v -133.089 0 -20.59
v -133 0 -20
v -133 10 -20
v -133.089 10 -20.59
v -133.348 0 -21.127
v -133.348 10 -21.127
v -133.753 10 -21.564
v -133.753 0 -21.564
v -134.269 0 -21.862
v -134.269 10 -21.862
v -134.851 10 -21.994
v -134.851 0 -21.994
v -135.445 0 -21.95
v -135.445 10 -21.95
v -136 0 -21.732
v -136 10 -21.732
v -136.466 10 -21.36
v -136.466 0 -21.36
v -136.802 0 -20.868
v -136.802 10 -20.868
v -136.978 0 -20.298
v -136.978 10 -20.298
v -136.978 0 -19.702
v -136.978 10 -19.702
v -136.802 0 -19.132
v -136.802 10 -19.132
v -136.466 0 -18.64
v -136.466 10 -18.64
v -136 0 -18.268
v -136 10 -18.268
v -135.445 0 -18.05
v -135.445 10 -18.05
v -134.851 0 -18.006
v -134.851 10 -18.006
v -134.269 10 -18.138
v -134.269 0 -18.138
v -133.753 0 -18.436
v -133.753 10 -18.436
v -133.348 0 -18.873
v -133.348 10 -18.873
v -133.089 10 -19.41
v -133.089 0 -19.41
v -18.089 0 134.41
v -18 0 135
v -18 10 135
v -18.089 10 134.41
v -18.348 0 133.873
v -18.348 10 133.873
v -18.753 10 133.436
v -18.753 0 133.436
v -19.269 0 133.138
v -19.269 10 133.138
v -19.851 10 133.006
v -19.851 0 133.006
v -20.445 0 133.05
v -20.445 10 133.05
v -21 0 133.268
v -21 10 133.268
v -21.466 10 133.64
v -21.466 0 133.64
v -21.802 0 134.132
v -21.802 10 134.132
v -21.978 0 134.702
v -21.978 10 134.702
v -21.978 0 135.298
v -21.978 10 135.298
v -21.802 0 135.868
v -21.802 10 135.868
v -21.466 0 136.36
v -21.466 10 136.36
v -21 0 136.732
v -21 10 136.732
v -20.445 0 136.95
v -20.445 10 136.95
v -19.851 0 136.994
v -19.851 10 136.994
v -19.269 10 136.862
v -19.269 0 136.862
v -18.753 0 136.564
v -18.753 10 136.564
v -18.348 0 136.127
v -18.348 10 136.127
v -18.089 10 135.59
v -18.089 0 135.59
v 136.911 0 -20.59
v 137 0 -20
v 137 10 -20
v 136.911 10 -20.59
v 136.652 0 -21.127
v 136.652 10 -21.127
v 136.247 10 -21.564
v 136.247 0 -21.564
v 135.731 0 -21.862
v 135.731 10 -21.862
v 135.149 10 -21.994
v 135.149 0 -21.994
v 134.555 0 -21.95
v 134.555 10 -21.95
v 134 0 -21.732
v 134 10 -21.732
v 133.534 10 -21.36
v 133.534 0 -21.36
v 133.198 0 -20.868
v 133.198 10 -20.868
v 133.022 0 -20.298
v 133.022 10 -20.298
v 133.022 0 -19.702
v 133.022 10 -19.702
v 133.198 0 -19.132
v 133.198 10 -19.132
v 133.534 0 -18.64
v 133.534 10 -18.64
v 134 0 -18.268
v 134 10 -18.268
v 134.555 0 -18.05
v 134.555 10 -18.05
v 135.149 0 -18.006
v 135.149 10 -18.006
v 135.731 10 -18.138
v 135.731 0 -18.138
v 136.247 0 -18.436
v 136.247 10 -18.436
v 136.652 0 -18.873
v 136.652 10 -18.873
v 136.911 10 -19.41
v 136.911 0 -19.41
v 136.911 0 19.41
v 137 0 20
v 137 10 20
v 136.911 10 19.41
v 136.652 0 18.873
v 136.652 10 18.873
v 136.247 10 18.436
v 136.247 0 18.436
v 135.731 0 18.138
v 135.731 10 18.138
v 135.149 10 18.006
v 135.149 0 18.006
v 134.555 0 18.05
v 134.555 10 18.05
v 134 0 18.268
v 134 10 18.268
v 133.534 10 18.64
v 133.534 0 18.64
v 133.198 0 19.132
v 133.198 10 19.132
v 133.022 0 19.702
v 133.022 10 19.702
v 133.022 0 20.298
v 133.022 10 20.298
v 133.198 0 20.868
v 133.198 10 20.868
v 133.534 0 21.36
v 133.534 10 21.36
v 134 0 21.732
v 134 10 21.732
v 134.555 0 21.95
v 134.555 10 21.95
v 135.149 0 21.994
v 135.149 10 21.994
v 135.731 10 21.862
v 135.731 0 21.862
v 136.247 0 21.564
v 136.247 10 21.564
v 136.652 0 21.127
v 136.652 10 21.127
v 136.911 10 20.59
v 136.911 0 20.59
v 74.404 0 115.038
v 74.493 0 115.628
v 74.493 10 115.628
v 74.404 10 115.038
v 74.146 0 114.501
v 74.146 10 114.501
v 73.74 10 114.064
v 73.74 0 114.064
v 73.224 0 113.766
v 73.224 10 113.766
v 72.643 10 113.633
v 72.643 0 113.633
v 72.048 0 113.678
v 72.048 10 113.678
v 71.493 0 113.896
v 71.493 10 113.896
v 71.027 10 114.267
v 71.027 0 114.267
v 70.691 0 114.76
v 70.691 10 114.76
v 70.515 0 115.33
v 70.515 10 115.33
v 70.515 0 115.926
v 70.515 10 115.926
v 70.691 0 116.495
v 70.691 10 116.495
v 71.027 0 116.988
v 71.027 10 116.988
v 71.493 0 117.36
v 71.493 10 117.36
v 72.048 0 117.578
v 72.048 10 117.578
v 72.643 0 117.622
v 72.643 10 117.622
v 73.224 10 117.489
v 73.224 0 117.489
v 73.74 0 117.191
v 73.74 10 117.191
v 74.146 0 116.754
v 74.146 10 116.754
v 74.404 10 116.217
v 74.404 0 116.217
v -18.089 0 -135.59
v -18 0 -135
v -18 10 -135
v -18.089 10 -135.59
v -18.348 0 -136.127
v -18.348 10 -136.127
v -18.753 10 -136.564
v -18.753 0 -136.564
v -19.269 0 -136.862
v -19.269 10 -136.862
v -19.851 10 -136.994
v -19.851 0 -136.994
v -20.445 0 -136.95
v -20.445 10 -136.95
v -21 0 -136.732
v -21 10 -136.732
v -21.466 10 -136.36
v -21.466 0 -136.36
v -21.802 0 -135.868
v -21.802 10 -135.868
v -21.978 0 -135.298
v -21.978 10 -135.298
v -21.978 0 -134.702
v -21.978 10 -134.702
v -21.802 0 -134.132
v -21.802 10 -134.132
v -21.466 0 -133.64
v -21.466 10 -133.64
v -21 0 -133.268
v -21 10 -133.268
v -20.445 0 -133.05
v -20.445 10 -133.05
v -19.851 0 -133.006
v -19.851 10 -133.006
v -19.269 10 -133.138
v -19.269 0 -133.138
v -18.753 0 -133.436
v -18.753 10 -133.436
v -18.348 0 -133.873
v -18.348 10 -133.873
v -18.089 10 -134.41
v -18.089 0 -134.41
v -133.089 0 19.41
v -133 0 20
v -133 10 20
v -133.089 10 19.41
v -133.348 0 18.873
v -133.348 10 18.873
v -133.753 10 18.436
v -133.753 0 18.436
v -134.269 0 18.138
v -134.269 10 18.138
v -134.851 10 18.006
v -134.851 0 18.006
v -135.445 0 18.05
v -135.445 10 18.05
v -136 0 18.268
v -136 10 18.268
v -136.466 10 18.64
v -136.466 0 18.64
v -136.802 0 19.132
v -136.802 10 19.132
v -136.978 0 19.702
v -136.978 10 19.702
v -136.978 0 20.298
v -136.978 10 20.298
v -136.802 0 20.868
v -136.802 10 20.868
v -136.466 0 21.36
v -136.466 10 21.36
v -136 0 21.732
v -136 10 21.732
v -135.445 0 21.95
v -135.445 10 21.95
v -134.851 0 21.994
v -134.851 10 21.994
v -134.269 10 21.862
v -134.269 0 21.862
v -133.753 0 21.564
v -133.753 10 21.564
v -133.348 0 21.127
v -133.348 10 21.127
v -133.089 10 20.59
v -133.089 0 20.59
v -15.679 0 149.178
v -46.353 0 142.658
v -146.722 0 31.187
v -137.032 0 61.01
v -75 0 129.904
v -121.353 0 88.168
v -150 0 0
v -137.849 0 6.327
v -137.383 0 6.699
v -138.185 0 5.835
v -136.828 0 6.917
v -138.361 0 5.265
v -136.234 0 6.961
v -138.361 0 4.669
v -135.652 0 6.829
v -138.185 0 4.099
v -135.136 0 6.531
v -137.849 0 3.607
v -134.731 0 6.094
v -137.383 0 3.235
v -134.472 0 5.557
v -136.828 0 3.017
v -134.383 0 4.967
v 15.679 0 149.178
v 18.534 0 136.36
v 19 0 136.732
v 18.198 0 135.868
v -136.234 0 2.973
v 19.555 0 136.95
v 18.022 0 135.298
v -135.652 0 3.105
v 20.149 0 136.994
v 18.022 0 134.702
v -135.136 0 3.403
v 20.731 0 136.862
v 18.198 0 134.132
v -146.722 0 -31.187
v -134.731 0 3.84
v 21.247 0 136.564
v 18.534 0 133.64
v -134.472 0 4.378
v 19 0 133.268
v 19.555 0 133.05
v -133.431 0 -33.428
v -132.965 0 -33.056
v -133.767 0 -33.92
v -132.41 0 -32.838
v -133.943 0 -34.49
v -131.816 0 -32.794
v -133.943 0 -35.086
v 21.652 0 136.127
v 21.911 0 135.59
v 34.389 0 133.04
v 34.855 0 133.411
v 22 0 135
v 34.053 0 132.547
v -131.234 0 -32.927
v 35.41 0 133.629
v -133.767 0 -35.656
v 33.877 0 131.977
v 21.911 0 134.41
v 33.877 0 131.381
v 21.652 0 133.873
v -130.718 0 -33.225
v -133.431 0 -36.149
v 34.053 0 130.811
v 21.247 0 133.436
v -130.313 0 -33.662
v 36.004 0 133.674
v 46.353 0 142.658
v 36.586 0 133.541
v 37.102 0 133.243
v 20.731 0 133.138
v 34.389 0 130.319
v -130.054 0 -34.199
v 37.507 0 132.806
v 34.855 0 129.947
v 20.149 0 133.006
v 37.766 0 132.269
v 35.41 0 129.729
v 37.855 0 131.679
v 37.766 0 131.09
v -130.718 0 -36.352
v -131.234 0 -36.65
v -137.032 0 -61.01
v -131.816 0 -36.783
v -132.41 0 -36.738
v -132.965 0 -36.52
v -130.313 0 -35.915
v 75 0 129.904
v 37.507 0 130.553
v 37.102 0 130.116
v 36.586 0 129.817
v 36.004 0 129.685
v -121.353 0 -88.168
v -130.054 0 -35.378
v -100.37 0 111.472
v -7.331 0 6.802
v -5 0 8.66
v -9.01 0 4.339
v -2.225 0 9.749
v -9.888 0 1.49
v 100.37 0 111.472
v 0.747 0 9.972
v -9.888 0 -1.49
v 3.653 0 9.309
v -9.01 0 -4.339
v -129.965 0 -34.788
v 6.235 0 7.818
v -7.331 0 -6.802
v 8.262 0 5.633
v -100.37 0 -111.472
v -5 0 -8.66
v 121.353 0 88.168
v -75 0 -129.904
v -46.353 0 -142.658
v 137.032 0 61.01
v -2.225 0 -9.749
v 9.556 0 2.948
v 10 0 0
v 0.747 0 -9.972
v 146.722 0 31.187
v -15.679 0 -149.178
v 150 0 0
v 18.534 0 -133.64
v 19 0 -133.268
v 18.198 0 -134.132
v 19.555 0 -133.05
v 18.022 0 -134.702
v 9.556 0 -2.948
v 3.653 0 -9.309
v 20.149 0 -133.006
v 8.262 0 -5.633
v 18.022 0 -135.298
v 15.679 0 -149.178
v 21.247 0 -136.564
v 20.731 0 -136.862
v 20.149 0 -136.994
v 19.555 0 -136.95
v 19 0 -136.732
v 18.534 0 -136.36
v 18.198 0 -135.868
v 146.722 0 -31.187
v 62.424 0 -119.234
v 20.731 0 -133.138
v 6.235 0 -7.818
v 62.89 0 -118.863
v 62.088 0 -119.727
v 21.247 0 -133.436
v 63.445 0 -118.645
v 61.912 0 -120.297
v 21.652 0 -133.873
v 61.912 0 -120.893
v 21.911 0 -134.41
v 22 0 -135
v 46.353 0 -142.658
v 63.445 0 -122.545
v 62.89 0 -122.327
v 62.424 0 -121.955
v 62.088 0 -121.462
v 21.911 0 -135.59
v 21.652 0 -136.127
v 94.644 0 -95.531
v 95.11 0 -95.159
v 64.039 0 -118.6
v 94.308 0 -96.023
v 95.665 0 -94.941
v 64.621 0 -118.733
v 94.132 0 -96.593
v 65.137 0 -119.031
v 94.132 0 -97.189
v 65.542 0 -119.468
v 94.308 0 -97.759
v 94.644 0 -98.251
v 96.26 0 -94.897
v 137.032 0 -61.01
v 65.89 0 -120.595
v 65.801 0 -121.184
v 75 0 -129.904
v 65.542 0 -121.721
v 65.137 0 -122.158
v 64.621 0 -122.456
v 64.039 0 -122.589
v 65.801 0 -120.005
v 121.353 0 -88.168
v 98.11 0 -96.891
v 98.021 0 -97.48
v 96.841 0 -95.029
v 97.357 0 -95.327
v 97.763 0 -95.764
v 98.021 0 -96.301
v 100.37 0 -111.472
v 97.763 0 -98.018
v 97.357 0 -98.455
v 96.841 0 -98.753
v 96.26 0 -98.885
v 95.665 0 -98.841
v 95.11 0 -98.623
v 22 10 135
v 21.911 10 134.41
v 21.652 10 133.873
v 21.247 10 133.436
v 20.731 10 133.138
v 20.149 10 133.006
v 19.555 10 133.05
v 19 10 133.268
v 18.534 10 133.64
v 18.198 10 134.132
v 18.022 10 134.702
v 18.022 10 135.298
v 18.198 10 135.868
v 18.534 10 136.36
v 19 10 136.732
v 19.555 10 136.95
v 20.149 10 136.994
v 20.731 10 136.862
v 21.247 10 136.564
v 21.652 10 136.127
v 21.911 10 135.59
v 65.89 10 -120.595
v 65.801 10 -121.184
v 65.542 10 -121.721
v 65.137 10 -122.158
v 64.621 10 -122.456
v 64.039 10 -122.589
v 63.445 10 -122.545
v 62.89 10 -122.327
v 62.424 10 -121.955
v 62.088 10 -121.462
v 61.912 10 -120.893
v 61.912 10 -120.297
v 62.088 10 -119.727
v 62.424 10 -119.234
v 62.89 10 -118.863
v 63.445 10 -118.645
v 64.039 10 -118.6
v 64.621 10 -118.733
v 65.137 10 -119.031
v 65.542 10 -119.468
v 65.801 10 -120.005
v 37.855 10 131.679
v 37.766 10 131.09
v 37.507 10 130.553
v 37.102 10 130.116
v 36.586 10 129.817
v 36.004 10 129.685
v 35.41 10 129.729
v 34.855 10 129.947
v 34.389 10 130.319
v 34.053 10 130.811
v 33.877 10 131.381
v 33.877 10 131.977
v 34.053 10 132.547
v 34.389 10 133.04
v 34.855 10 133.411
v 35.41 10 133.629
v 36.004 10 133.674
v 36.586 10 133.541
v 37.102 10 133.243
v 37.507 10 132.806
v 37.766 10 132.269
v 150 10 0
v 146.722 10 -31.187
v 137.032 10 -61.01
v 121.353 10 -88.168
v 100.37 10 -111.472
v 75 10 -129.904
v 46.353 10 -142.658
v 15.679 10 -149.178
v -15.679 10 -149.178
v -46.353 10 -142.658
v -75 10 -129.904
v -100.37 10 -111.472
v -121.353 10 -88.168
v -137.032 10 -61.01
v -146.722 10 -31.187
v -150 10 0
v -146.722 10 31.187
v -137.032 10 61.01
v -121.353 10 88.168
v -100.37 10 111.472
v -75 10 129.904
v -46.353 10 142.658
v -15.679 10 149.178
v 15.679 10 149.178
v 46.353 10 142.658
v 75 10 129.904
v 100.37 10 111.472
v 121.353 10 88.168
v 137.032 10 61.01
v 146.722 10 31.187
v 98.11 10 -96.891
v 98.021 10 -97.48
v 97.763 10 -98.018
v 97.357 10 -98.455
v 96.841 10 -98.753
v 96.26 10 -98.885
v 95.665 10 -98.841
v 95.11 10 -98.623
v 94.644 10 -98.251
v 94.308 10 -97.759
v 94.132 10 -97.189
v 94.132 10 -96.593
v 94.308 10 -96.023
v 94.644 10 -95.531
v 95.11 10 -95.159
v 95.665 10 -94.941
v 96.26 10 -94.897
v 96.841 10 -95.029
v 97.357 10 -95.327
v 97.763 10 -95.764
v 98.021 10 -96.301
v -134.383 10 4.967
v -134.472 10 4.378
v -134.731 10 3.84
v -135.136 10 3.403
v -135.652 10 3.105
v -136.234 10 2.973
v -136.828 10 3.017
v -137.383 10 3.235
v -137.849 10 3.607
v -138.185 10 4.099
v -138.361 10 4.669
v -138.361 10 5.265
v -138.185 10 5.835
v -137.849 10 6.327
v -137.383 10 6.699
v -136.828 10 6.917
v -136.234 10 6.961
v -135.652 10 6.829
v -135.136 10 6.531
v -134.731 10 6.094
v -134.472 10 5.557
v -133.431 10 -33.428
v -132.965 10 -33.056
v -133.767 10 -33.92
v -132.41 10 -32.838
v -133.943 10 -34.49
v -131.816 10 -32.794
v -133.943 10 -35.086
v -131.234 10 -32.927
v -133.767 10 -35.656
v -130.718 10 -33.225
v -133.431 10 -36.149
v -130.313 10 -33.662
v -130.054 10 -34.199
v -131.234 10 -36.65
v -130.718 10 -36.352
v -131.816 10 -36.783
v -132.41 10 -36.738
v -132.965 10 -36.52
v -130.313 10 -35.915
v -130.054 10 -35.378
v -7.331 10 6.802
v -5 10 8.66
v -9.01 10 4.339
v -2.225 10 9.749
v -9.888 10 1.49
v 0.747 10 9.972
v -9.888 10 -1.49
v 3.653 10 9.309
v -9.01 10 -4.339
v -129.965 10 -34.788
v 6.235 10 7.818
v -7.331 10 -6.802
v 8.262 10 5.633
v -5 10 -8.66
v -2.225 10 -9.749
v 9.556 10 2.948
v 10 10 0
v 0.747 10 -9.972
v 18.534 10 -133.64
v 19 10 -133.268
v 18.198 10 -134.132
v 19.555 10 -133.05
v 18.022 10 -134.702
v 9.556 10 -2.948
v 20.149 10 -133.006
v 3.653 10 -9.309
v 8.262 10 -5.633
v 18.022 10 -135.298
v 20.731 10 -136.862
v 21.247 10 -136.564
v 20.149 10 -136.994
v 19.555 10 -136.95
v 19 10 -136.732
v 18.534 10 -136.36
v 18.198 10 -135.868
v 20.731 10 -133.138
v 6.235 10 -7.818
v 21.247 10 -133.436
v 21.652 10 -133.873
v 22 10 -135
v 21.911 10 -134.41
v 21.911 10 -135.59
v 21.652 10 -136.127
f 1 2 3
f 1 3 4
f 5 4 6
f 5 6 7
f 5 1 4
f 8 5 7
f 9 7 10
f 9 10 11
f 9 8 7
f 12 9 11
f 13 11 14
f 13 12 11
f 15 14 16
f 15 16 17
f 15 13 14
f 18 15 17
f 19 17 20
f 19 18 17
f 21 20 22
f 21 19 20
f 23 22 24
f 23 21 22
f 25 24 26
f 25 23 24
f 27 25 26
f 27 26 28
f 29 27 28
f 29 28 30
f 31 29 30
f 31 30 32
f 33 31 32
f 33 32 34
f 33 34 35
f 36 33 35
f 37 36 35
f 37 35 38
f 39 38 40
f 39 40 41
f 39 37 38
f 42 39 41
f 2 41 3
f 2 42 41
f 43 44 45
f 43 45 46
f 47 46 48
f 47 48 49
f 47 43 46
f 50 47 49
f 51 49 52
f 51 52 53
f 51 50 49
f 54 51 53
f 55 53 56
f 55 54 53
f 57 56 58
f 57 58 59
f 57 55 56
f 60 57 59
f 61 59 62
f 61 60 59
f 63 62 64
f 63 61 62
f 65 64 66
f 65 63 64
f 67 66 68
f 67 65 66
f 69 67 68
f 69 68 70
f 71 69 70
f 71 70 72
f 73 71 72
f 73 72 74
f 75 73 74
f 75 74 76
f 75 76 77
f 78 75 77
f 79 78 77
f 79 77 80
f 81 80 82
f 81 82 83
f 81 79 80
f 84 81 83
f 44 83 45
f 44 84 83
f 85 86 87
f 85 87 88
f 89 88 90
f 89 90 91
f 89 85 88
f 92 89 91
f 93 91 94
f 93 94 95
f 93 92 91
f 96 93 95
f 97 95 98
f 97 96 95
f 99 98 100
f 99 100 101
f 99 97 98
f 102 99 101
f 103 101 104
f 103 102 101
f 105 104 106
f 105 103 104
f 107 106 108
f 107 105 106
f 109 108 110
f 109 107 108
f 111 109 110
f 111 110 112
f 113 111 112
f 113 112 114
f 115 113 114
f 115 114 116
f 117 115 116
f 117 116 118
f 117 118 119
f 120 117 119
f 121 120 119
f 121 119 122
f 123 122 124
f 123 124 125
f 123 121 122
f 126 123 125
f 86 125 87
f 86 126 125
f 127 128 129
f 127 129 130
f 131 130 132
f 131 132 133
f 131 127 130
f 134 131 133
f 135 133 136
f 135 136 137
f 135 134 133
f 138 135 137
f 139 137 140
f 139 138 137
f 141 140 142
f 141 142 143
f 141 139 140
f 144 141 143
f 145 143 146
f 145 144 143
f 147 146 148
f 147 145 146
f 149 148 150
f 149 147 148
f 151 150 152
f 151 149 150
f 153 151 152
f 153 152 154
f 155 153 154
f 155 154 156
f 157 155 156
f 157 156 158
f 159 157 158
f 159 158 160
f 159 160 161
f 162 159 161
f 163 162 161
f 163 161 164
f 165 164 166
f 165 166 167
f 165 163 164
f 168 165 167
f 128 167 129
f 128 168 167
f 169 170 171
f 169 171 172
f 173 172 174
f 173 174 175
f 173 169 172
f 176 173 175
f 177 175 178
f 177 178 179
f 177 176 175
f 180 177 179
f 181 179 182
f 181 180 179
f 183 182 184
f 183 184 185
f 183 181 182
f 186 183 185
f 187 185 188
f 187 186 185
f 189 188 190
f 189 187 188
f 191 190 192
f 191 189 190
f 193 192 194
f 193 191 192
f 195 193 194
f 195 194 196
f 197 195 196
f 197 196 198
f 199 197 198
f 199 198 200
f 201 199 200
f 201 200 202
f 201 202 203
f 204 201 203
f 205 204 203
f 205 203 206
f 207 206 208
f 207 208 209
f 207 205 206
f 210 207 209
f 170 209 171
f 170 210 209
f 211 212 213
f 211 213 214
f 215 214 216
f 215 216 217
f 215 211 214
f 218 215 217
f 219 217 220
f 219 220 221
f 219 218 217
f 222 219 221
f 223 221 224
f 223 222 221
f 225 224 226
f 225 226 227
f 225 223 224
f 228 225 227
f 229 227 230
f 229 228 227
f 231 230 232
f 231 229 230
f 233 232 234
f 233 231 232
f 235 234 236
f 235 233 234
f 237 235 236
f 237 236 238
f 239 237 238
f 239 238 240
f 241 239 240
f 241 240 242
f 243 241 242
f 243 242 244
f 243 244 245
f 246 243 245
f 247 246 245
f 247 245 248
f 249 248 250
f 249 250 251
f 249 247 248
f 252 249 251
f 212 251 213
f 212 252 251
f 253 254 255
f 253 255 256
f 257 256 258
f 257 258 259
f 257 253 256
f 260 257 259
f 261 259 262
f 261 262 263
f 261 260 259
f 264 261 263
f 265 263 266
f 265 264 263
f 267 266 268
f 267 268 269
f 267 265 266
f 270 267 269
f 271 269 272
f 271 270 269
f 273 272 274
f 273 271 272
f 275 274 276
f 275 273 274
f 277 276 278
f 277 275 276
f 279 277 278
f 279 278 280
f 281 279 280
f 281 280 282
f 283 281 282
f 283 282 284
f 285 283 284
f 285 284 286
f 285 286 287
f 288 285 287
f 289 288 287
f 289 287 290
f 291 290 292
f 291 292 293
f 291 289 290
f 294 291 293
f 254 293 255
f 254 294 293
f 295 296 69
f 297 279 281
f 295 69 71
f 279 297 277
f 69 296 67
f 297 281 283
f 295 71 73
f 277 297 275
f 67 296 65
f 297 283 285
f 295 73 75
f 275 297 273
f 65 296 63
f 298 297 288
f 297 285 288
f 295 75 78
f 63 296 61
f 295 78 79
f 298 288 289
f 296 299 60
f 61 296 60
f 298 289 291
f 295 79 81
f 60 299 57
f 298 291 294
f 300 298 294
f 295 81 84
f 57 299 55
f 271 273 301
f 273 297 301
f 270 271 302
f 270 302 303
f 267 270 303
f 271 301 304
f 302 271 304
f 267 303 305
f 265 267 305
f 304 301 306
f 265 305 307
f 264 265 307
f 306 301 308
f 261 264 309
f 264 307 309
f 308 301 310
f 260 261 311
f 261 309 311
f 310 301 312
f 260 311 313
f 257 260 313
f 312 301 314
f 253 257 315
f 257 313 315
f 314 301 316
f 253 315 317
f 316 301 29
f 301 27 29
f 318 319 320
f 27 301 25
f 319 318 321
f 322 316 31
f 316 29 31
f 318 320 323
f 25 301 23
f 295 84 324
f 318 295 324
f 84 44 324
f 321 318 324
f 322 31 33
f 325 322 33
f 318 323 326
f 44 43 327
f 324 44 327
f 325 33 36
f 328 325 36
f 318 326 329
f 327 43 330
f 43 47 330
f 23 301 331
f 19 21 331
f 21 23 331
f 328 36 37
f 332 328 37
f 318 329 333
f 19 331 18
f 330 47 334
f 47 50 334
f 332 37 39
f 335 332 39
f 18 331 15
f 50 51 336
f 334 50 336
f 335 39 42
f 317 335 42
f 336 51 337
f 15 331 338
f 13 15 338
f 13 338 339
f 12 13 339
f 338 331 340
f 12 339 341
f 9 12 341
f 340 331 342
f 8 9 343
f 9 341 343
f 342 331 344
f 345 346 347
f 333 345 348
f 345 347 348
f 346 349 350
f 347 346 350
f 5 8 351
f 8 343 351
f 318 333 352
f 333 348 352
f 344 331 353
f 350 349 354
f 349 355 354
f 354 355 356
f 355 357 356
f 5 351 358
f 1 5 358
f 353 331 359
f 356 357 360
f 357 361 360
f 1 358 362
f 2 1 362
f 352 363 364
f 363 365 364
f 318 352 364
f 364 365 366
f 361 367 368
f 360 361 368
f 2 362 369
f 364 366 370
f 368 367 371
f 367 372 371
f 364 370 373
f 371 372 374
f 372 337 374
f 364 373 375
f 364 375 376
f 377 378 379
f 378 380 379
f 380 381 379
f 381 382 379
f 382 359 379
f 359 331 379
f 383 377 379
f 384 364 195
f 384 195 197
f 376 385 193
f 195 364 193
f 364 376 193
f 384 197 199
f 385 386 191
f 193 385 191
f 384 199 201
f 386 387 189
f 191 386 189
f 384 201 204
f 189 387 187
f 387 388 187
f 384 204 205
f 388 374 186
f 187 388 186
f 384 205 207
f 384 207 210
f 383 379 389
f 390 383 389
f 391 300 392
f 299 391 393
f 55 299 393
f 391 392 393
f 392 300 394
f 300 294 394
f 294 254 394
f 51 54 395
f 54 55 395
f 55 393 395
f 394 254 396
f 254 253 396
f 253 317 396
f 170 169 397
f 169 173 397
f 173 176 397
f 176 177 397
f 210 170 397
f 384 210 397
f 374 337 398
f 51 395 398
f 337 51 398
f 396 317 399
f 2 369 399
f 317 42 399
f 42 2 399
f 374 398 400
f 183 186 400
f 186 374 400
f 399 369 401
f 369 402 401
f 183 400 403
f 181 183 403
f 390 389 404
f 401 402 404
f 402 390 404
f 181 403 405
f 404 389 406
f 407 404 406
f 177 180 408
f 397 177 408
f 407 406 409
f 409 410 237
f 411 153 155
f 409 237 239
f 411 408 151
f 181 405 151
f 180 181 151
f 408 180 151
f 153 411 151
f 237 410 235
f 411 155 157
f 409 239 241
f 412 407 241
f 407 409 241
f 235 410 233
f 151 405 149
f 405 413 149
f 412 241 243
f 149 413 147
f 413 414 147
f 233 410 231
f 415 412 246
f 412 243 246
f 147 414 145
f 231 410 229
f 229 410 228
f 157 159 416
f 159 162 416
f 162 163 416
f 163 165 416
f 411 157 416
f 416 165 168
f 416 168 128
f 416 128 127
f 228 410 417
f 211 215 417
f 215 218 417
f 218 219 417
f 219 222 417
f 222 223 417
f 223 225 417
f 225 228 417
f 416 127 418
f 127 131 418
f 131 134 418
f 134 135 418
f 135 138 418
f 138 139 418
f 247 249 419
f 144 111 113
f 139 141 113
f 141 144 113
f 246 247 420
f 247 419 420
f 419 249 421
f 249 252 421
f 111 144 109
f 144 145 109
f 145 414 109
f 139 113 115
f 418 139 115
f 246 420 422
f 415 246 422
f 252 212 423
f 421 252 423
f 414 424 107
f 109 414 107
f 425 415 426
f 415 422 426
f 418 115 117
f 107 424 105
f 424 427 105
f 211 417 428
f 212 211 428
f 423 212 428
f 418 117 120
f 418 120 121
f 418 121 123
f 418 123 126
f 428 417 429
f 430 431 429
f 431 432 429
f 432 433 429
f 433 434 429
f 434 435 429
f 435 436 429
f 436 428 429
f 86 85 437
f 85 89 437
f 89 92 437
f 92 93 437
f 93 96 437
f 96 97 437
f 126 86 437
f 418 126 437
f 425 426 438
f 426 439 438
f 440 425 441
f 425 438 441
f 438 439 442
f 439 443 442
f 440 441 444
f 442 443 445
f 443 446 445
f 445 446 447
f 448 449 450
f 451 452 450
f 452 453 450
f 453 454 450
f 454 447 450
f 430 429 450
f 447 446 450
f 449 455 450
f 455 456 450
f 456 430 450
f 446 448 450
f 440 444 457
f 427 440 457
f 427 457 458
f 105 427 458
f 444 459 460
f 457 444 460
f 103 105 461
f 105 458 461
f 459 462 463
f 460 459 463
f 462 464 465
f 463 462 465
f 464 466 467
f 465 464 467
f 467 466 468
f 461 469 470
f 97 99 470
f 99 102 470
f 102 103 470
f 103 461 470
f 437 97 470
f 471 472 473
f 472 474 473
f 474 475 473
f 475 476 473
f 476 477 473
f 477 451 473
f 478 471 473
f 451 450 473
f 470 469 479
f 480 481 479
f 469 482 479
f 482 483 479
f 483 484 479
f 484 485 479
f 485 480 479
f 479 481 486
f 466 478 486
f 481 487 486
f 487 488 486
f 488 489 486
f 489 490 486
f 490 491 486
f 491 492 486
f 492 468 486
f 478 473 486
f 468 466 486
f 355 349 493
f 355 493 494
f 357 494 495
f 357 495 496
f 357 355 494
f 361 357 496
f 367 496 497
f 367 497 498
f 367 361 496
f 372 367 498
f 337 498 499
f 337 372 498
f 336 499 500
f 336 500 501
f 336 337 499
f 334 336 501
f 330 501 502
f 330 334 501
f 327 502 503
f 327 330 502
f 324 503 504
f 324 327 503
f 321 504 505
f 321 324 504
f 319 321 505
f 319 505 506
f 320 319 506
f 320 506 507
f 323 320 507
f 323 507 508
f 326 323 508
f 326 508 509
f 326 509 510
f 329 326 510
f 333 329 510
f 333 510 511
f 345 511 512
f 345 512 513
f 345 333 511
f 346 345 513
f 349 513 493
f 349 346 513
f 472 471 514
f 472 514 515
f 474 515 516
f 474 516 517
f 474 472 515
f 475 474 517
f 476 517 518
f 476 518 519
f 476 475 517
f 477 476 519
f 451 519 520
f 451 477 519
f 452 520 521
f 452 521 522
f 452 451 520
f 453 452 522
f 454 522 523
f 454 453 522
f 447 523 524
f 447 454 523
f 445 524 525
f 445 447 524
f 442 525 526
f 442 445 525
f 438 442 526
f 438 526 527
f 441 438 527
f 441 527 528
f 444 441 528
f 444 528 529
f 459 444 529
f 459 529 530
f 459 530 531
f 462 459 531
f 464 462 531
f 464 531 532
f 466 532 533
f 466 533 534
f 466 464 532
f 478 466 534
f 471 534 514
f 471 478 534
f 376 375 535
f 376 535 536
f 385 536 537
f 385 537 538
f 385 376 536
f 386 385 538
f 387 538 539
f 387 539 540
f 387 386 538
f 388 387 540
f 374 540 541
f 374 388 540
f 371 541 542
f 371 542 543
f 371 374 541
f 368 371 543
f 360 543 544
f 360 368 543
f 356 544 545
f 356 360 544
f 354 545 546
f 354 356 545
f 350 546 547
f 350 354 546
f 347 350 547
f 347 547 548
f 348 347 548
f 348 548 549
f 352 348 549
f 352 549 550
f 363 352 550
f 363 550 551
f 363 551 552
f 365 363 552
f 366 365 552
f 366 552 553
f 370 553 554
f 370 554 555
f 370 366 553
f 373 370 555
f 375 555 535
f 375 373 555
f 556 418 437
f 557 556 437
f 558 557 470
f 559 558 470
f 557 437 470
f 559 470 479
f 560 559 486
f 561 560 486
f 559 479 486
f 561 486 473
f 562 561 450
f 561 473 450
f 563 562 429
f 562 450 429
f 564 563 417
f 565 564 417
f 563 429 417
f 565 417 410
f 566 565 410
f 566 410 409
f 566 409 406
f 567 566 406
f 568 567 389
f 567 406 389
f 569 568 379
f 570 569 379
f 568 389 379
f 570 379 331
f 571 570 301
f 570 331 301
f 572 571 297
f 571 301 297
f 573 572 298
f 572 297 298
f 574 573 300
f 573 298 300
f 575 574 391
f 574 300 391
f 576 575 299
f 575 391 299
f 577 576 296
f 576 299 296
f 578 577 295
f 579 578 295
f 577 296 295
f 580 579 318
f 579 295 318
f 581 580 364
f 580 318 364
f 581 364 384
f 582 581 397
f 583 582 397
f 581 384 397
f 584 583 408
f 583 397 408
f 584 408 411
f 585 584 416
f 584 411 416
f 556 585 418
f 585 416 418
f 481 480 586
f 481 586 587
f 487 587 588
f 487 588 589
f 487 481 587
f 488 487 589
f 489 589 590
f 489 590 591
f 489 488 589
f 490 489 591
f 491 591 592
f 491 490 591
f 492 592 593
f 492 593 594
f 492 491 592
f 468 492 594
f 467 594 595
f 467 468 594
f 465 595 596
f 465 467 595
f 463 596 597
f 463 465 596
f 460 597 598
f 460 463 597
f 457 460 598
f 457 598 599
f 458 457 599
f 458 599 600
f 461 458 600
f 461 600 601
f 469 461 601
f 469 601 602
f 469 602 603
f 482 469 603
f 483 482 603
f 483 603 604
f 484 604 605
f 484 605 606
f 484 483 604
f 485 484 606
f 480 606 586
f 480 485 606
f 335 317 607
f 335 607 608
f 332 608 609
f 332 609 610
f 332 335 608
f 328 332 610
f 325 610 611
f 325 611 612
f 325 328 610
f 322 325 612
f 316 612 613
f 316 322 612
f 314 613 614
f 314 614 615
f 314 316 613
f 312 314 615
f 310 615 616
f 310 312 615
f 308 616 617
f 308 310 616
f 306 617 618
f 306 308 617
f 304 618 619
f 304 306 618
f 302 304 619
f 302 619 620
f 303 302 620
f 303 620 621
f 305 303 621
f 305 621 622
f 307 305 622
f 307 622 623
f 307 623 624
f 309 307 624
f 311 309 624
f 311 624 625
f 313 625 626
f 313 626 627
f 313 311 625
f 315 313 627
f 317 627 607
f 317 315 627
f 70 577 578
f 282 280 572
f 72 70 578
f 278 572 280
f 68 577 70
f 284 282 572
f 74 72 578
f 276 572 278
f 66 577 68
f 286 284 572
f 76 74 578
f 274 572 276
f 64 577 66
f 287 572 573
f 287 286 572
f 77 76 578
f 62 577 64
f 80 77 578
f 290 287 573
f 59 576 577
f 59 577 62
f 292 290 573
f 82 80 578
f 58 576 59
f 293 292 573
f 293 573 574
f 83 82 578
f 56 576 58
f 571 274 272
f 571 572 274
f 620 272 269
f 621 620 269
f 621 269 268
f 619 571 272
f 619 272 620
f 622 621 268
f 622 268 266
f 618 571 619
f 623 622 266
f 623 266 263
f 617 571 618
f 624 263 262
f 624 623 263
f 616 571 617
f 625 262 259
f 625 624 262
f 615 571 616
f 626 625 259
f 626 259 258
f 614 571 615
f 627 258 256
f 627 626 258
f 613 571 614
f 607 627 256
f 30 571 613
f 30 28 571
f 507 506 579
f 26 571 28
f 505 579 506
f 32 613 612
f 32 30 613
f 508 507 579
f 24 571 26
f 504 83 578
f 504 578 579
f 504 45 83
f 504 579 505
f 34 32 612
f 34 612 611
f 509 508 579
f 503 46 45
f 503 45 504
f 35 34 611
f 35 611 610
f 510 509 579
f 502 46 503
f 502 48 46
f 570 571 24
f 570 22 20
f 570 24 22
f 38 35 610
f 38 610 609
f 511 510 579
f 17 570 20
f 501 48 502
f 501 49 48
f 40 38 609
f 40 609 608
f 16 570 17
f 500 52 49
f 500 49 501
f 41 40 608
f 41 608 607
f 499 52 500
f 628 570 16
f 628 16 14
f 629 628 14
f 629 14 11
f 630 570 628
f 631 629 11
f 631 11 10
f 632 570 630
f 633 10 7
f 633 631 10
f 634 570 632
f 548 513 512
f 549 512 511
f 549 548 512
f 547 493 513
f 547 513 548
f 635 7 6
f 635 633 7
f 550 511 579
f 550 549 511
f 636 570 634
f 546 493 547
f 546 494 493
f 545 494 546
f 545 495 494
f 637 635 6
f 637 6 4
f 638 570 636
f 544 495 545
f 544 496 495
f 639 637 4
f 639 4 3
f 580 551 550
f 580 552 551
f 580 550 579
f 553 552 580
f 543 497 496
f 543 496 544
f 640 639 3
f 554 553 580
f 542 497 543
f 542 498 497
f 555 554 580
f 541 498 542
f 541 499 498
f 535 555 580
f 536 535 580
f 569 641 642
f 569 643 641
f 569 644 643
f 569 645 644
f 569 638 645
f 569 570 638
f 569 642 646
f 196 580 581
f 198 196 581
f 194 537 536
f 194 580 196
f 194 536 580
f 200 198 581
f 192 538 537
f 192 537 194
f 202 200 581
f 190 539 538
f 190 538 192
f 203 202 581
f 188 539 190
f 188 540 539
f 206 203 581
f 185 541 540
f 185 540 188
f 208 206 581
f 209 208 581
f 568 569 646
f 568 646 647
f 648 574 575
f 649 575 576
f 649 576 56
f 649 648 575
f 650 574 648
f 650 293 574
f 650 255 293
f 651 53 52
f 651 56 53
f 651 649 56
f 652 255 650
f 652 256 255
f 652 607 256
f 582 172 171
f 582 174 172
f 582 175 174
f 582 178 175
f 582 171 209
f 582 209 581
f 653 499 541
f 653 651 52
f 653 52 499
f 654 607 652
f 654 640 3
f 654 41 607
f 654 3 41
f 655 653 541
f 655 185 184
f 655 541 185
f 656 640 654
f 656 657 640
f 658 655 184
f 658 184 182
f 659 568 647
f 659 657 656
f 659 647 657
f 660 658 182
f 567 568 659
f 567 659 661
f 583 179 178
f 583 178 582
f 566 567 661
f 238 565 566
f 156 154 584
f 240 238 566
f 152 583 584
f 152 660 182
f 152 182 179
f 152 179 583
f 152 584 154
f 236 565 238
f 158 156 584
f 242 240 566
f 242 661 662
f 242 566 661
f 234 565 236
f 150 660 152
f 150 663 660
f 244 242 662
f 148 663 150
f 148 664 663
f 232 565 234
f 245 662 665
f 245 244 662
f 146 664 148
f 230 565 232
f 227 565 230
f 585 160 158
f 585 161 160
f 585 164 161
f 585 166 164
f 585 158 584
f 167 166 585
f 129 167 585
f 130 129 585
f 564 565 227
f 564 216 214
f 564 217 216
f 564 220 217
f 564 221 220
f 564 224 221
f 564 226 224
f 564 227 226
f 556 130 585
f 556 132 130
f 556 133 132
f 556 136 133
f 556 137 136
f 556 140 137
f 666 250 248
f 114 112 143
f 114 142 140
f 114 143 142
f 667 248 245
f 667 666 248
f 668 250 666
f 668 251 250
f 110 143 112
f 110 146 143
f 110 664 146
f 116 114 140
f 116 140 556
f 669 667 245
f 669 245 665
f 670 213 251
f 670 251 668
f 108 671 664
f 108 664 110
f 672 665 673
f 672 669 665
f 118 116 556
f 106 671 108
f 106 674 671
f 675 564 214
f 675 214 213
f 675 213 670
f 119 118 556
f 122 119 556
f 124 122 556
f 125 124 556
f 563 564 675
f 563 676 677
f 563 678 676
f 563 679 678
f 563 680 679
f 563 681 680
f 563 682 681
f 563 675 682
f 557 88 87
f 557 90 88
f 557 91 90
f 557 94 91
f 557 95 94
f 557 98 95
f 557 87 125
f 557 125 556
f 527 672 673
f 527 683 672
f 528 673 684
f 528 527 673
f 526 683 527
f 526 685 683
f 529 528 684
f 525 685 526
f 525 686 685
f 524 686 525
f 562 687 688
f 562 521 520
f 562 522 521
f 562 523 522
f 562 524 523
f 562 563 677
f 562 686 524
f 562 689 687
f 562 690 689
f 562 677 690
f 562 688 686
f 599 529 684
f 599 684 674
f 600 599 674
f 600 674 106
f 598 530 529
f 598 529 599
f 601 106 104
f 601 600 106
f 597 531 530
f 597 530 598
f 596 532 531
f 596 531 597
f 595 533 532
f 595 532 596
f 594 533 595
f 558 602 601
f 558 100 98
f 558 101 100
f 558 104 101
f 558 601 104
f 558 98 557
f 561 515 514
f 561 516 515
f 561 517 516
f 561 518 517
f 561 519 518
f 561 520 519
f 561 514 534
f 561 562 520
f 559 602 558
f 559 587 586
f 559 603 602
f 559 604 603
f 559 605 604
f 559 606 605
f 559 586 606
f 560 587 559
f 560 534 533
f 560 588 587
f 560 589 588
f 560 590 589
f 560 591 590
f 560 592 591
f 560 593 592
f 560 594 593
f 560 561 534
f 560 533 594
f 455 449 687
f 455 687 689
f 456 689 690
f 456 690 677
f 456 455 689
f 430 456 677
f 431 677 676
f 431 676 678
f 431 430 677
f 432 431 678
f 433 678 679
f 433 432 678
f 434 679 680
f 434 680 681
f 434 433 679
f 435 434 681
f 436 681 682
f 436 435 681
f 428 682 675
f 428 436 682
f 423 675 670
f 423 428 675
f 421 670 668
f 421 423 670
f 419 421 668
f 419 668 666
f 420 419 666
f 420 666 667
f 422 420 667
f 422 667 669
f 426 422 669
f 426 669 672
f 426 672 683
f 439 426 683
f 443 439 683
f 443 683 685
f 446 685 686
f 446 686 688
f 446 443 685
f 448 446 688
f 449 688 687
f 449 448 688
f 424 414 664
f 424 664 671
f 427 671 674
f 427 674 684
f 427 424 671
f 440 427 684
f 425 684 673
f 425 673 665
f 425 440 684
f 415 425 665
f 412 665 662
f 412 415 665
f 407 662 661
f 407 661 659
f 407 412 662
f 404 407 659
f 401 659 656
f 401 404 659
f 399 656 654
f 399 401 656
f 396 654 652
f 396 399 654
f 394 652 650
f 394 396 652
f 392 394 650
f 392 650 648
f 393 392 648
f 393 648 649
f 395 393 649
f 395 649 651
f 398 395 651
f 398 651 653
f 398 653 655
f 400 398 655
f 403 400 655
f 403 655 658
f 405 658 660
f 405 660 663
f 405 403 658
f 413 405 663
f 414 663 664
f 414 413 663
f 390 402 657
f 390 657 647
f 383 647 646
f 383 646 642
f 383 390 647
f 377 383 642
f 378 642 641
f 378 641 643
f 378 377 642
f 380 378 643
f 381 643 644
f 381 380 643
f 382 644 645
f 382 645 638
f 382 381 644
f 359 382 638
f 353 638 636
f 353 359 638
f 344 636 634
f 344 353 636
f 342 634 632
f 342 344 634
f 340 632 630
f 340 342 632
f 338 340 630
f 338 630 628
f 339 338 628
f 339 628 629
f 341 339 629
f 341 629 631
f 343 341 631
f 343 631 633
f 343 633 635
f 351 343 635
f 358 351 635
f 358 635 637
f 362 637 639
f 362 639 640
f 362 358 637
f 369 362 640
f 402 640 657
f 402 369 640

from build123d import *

# Parameters (mm, degrees)
SKETCH_1_R      = 150
SKETCH_1_R_2    = 2
SKETCH_1_R_3    = 10
EXTRUDE_1_DEPTH = 10


with BuildPart() as part:
    # 草圖1 → 填料-伸長1 (new body)
    with BuildSketch(Plane(origin=(0, 0, 0), x_dir=(1, 0, 0), z_dir=(0, 1, 0))):
        Circle(SKETCH_1_R)
        with Locations((-20, 135)):
            Circle(SKETCH_1_R_2, mode=Mode.SUBTRACT)
        with Locations((20, 135)):
            Circle(SKETCH_1_R_2, mode=Mode.SUBTRACT)
        with Locations((135, 20)):
            Circle(SKETCH_1_R_2, mode=Mode.SUBTRACT)
        with Locations((135, -20)):
            Circle(SKETCH_1_R_2, mode=Mode.SUBTRACT)
        with Locations((20, -135)):
            Circle(SKETCH_1_R_2, mode=Mode.SUBTRACT)
        with Locations((-20, -135)):
            Circle(SKETCH_1_R_2, mode=Mode.SUBTRACT)
        with Locations((-135, -20)):
            Circle(SKETCH_1_R_2, mode=Mode.SUBTRACT)
        with Locations((-135, 20)):
            Circle(SKETCH_1_R_2, mode=Mode.SUBTRACT)
        Circle(SKETCH_1_R_3, mode=Mode.SUBTRACT)
        with Locations((63.889953207, 120.594667707)):
            Circle(SKETCH_1_R_2, mode=Mode.SUBTRACT)
        with Locations((96.110046793, 96.890964003)):
            Circle(SKETCH_1_R_2, mode=Mode.SUBTRACT)
        with Locations((72.493069191, -115.627656377)):
            Circle(SKETCH_1_R_2, mode=Mode.SUBTRACT)
        with Locations((35.855012827, -131.679224083)):
            Circle(SKETCH_1_R_2, mode=Mode.SUBTRACT)
        with Locations((-136.383022398, -4.96701133)):
            Circle(SKETCH_1_R_2, mode=Mode.SUBTRACT)
        with Locations((-131.96505962, 34.78826008)):
            Circle(SKETCH_1_R_2, mode=Mode.SUBTRACT)
    extrude(amount=EXTRUDE_1_DEPTH)


solid = part.part
